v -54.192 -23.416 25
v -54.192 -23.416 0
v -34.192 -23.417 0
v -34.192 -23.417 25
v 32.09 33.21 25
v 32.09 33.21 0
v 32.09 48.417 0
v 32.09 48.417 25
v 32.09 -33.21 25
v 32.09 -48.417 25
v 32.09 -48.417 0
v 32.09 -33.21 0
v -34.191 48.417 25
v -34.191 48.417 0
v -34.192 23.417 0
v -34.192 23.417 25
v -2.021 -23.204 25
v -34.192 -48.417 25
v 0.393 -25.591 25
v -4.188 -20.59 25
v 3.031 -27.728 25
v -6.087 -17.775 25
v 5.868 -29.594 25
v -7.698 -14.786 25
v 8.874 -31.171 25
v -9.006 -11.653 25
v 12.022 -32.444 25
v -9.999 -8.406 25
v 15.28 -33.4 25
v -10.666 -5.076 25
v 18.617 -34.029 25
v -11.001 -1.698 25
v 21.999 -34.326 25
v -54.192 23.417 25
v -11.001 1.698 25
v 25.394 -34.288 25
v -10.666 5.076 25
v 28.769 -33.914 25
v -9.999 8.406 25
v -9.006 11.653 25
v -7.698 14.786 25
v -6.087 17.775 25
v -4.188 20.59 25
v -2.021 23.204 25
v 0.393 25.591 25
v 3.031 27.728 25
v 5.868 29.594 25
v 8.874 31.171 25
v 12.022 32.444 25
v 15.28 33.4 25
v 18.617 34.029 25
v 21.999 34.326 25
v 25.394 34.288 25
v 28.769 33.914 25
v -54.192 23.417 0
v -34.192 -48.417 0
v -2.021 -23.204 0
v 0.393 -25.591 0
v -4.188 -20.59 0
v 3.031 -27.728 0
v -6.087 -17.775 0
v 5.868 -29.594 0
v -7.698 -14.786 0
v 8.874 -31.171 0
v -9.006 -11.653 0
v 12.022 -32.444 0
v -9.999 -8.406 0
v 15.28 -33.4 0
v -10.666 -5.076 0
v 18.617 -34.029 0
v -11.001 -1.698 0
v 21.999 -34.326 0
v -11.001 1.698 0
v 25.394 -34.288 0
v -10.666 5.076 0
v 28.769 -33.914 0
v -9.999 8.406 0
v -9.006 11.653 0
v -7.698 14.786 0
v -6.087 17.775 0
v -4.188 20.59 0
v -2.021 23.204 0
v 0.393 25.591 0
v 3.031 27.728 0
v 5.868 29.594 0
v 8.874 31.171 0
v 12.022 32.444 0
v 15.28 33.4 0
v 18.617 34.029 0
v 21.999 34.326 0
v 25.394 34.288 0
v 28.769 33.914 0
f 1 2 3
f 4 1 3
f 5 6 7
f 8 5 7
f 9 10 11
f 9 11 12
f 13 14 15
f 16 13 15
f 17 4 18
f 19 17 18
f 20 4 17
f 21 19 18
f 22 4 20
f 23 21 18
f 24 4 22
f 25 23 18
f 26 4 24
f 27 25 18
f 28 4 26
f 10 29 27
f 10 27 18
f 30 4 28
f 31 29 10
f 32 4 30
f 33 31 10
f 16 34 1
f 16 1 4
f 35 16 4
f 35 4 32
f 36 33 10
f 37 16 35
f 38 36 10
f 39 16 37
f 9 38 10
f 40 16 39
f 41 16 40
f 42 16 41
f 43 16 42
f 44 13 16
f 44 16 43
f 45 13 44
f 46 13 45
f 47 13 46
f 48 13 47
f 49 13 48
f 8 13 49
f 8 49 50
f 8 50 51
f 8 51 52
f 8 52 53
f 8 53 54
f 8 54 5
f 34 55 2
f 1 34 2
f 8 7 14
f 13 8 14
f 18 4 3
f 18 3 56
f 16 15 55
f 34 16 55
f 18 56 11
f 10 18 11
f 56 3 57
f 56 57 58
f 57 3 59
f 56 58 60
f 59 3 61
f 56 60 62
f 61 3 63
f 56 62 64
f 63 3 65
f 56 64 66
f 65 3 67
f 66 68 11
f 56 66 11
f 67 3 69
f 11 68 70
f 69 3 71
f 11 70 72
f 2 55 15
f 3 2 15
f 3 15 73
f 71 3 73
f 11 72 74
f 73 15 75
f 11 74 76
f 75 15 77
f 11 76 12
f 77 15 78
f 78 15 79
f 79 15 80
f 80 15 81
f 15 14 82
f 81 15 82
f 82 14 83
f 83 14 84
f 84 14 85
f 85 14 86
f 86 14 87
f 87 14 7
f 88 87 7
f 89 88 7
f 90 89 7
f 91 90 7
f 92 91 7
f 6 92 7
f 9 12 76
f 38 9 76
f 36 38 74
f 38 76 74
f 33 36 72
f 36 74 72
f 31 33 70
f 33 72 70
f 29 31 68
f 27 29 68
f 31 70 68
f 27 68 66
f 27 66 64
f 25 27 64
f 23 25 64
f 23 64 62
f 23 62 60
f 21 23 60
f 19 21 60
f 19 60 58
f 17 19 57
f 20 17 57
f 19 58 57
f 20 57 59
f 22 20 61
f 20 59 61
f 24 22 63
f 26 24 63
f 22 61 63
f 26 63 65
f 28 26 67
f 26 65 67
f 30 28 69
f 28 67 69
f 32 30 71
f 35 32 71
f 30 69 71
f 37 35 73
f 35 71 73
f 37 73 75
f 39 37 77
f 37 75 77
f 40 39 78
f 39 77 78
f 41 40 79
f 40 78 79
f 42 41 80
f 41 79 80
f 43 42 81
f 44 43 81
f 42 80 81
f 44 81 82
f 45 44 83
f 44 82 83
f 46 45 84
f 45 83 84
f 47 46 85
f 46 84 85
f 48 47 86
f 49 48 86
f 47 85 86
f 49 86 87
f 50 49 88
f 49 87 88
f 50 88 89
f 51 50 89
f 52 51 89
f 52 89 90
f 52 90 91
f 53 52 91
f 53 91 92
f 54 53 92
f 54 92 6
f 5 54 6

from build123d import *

# Parameters (mm, degrees)
F1_DEPTH = 25


with BuildPart() as f1:
    # F0 (on Top) → F1 (new body)
    with BuildSketch(Plane.XY):
        with BuildLine():
            Line((32.09034, 33.209568), (32.09034, 48.417067))
            Line((32.09034, 48.417067), (-34.191456, 48.417067))
            Line((-34.191456, 48.417067), (-34.191667, 23.417067))
            Line((-34.191667, 23.417067), (-54.191667, 23.417236))
            Line((-54.191667, 23.417236), (-54.19166, -23.416399))
            Line((-54.19166, -23.416399), (-34.19166, -23.416568))
            Line((-34.19166, -23.416568), (-34.19166, -48.416568))
            Line((-34.19166, -48.416568), (32.09034, -48.416568))
            Line((32.09034, -48.416568), (32.09034, -33.209568))
            ThreePointArc((32.09034, -33.209568), (-11.042779, 0), (32.09034, 33.209568))
        make_face()
    extrude(amount=F1_DEPTH)


solid = f1.part
